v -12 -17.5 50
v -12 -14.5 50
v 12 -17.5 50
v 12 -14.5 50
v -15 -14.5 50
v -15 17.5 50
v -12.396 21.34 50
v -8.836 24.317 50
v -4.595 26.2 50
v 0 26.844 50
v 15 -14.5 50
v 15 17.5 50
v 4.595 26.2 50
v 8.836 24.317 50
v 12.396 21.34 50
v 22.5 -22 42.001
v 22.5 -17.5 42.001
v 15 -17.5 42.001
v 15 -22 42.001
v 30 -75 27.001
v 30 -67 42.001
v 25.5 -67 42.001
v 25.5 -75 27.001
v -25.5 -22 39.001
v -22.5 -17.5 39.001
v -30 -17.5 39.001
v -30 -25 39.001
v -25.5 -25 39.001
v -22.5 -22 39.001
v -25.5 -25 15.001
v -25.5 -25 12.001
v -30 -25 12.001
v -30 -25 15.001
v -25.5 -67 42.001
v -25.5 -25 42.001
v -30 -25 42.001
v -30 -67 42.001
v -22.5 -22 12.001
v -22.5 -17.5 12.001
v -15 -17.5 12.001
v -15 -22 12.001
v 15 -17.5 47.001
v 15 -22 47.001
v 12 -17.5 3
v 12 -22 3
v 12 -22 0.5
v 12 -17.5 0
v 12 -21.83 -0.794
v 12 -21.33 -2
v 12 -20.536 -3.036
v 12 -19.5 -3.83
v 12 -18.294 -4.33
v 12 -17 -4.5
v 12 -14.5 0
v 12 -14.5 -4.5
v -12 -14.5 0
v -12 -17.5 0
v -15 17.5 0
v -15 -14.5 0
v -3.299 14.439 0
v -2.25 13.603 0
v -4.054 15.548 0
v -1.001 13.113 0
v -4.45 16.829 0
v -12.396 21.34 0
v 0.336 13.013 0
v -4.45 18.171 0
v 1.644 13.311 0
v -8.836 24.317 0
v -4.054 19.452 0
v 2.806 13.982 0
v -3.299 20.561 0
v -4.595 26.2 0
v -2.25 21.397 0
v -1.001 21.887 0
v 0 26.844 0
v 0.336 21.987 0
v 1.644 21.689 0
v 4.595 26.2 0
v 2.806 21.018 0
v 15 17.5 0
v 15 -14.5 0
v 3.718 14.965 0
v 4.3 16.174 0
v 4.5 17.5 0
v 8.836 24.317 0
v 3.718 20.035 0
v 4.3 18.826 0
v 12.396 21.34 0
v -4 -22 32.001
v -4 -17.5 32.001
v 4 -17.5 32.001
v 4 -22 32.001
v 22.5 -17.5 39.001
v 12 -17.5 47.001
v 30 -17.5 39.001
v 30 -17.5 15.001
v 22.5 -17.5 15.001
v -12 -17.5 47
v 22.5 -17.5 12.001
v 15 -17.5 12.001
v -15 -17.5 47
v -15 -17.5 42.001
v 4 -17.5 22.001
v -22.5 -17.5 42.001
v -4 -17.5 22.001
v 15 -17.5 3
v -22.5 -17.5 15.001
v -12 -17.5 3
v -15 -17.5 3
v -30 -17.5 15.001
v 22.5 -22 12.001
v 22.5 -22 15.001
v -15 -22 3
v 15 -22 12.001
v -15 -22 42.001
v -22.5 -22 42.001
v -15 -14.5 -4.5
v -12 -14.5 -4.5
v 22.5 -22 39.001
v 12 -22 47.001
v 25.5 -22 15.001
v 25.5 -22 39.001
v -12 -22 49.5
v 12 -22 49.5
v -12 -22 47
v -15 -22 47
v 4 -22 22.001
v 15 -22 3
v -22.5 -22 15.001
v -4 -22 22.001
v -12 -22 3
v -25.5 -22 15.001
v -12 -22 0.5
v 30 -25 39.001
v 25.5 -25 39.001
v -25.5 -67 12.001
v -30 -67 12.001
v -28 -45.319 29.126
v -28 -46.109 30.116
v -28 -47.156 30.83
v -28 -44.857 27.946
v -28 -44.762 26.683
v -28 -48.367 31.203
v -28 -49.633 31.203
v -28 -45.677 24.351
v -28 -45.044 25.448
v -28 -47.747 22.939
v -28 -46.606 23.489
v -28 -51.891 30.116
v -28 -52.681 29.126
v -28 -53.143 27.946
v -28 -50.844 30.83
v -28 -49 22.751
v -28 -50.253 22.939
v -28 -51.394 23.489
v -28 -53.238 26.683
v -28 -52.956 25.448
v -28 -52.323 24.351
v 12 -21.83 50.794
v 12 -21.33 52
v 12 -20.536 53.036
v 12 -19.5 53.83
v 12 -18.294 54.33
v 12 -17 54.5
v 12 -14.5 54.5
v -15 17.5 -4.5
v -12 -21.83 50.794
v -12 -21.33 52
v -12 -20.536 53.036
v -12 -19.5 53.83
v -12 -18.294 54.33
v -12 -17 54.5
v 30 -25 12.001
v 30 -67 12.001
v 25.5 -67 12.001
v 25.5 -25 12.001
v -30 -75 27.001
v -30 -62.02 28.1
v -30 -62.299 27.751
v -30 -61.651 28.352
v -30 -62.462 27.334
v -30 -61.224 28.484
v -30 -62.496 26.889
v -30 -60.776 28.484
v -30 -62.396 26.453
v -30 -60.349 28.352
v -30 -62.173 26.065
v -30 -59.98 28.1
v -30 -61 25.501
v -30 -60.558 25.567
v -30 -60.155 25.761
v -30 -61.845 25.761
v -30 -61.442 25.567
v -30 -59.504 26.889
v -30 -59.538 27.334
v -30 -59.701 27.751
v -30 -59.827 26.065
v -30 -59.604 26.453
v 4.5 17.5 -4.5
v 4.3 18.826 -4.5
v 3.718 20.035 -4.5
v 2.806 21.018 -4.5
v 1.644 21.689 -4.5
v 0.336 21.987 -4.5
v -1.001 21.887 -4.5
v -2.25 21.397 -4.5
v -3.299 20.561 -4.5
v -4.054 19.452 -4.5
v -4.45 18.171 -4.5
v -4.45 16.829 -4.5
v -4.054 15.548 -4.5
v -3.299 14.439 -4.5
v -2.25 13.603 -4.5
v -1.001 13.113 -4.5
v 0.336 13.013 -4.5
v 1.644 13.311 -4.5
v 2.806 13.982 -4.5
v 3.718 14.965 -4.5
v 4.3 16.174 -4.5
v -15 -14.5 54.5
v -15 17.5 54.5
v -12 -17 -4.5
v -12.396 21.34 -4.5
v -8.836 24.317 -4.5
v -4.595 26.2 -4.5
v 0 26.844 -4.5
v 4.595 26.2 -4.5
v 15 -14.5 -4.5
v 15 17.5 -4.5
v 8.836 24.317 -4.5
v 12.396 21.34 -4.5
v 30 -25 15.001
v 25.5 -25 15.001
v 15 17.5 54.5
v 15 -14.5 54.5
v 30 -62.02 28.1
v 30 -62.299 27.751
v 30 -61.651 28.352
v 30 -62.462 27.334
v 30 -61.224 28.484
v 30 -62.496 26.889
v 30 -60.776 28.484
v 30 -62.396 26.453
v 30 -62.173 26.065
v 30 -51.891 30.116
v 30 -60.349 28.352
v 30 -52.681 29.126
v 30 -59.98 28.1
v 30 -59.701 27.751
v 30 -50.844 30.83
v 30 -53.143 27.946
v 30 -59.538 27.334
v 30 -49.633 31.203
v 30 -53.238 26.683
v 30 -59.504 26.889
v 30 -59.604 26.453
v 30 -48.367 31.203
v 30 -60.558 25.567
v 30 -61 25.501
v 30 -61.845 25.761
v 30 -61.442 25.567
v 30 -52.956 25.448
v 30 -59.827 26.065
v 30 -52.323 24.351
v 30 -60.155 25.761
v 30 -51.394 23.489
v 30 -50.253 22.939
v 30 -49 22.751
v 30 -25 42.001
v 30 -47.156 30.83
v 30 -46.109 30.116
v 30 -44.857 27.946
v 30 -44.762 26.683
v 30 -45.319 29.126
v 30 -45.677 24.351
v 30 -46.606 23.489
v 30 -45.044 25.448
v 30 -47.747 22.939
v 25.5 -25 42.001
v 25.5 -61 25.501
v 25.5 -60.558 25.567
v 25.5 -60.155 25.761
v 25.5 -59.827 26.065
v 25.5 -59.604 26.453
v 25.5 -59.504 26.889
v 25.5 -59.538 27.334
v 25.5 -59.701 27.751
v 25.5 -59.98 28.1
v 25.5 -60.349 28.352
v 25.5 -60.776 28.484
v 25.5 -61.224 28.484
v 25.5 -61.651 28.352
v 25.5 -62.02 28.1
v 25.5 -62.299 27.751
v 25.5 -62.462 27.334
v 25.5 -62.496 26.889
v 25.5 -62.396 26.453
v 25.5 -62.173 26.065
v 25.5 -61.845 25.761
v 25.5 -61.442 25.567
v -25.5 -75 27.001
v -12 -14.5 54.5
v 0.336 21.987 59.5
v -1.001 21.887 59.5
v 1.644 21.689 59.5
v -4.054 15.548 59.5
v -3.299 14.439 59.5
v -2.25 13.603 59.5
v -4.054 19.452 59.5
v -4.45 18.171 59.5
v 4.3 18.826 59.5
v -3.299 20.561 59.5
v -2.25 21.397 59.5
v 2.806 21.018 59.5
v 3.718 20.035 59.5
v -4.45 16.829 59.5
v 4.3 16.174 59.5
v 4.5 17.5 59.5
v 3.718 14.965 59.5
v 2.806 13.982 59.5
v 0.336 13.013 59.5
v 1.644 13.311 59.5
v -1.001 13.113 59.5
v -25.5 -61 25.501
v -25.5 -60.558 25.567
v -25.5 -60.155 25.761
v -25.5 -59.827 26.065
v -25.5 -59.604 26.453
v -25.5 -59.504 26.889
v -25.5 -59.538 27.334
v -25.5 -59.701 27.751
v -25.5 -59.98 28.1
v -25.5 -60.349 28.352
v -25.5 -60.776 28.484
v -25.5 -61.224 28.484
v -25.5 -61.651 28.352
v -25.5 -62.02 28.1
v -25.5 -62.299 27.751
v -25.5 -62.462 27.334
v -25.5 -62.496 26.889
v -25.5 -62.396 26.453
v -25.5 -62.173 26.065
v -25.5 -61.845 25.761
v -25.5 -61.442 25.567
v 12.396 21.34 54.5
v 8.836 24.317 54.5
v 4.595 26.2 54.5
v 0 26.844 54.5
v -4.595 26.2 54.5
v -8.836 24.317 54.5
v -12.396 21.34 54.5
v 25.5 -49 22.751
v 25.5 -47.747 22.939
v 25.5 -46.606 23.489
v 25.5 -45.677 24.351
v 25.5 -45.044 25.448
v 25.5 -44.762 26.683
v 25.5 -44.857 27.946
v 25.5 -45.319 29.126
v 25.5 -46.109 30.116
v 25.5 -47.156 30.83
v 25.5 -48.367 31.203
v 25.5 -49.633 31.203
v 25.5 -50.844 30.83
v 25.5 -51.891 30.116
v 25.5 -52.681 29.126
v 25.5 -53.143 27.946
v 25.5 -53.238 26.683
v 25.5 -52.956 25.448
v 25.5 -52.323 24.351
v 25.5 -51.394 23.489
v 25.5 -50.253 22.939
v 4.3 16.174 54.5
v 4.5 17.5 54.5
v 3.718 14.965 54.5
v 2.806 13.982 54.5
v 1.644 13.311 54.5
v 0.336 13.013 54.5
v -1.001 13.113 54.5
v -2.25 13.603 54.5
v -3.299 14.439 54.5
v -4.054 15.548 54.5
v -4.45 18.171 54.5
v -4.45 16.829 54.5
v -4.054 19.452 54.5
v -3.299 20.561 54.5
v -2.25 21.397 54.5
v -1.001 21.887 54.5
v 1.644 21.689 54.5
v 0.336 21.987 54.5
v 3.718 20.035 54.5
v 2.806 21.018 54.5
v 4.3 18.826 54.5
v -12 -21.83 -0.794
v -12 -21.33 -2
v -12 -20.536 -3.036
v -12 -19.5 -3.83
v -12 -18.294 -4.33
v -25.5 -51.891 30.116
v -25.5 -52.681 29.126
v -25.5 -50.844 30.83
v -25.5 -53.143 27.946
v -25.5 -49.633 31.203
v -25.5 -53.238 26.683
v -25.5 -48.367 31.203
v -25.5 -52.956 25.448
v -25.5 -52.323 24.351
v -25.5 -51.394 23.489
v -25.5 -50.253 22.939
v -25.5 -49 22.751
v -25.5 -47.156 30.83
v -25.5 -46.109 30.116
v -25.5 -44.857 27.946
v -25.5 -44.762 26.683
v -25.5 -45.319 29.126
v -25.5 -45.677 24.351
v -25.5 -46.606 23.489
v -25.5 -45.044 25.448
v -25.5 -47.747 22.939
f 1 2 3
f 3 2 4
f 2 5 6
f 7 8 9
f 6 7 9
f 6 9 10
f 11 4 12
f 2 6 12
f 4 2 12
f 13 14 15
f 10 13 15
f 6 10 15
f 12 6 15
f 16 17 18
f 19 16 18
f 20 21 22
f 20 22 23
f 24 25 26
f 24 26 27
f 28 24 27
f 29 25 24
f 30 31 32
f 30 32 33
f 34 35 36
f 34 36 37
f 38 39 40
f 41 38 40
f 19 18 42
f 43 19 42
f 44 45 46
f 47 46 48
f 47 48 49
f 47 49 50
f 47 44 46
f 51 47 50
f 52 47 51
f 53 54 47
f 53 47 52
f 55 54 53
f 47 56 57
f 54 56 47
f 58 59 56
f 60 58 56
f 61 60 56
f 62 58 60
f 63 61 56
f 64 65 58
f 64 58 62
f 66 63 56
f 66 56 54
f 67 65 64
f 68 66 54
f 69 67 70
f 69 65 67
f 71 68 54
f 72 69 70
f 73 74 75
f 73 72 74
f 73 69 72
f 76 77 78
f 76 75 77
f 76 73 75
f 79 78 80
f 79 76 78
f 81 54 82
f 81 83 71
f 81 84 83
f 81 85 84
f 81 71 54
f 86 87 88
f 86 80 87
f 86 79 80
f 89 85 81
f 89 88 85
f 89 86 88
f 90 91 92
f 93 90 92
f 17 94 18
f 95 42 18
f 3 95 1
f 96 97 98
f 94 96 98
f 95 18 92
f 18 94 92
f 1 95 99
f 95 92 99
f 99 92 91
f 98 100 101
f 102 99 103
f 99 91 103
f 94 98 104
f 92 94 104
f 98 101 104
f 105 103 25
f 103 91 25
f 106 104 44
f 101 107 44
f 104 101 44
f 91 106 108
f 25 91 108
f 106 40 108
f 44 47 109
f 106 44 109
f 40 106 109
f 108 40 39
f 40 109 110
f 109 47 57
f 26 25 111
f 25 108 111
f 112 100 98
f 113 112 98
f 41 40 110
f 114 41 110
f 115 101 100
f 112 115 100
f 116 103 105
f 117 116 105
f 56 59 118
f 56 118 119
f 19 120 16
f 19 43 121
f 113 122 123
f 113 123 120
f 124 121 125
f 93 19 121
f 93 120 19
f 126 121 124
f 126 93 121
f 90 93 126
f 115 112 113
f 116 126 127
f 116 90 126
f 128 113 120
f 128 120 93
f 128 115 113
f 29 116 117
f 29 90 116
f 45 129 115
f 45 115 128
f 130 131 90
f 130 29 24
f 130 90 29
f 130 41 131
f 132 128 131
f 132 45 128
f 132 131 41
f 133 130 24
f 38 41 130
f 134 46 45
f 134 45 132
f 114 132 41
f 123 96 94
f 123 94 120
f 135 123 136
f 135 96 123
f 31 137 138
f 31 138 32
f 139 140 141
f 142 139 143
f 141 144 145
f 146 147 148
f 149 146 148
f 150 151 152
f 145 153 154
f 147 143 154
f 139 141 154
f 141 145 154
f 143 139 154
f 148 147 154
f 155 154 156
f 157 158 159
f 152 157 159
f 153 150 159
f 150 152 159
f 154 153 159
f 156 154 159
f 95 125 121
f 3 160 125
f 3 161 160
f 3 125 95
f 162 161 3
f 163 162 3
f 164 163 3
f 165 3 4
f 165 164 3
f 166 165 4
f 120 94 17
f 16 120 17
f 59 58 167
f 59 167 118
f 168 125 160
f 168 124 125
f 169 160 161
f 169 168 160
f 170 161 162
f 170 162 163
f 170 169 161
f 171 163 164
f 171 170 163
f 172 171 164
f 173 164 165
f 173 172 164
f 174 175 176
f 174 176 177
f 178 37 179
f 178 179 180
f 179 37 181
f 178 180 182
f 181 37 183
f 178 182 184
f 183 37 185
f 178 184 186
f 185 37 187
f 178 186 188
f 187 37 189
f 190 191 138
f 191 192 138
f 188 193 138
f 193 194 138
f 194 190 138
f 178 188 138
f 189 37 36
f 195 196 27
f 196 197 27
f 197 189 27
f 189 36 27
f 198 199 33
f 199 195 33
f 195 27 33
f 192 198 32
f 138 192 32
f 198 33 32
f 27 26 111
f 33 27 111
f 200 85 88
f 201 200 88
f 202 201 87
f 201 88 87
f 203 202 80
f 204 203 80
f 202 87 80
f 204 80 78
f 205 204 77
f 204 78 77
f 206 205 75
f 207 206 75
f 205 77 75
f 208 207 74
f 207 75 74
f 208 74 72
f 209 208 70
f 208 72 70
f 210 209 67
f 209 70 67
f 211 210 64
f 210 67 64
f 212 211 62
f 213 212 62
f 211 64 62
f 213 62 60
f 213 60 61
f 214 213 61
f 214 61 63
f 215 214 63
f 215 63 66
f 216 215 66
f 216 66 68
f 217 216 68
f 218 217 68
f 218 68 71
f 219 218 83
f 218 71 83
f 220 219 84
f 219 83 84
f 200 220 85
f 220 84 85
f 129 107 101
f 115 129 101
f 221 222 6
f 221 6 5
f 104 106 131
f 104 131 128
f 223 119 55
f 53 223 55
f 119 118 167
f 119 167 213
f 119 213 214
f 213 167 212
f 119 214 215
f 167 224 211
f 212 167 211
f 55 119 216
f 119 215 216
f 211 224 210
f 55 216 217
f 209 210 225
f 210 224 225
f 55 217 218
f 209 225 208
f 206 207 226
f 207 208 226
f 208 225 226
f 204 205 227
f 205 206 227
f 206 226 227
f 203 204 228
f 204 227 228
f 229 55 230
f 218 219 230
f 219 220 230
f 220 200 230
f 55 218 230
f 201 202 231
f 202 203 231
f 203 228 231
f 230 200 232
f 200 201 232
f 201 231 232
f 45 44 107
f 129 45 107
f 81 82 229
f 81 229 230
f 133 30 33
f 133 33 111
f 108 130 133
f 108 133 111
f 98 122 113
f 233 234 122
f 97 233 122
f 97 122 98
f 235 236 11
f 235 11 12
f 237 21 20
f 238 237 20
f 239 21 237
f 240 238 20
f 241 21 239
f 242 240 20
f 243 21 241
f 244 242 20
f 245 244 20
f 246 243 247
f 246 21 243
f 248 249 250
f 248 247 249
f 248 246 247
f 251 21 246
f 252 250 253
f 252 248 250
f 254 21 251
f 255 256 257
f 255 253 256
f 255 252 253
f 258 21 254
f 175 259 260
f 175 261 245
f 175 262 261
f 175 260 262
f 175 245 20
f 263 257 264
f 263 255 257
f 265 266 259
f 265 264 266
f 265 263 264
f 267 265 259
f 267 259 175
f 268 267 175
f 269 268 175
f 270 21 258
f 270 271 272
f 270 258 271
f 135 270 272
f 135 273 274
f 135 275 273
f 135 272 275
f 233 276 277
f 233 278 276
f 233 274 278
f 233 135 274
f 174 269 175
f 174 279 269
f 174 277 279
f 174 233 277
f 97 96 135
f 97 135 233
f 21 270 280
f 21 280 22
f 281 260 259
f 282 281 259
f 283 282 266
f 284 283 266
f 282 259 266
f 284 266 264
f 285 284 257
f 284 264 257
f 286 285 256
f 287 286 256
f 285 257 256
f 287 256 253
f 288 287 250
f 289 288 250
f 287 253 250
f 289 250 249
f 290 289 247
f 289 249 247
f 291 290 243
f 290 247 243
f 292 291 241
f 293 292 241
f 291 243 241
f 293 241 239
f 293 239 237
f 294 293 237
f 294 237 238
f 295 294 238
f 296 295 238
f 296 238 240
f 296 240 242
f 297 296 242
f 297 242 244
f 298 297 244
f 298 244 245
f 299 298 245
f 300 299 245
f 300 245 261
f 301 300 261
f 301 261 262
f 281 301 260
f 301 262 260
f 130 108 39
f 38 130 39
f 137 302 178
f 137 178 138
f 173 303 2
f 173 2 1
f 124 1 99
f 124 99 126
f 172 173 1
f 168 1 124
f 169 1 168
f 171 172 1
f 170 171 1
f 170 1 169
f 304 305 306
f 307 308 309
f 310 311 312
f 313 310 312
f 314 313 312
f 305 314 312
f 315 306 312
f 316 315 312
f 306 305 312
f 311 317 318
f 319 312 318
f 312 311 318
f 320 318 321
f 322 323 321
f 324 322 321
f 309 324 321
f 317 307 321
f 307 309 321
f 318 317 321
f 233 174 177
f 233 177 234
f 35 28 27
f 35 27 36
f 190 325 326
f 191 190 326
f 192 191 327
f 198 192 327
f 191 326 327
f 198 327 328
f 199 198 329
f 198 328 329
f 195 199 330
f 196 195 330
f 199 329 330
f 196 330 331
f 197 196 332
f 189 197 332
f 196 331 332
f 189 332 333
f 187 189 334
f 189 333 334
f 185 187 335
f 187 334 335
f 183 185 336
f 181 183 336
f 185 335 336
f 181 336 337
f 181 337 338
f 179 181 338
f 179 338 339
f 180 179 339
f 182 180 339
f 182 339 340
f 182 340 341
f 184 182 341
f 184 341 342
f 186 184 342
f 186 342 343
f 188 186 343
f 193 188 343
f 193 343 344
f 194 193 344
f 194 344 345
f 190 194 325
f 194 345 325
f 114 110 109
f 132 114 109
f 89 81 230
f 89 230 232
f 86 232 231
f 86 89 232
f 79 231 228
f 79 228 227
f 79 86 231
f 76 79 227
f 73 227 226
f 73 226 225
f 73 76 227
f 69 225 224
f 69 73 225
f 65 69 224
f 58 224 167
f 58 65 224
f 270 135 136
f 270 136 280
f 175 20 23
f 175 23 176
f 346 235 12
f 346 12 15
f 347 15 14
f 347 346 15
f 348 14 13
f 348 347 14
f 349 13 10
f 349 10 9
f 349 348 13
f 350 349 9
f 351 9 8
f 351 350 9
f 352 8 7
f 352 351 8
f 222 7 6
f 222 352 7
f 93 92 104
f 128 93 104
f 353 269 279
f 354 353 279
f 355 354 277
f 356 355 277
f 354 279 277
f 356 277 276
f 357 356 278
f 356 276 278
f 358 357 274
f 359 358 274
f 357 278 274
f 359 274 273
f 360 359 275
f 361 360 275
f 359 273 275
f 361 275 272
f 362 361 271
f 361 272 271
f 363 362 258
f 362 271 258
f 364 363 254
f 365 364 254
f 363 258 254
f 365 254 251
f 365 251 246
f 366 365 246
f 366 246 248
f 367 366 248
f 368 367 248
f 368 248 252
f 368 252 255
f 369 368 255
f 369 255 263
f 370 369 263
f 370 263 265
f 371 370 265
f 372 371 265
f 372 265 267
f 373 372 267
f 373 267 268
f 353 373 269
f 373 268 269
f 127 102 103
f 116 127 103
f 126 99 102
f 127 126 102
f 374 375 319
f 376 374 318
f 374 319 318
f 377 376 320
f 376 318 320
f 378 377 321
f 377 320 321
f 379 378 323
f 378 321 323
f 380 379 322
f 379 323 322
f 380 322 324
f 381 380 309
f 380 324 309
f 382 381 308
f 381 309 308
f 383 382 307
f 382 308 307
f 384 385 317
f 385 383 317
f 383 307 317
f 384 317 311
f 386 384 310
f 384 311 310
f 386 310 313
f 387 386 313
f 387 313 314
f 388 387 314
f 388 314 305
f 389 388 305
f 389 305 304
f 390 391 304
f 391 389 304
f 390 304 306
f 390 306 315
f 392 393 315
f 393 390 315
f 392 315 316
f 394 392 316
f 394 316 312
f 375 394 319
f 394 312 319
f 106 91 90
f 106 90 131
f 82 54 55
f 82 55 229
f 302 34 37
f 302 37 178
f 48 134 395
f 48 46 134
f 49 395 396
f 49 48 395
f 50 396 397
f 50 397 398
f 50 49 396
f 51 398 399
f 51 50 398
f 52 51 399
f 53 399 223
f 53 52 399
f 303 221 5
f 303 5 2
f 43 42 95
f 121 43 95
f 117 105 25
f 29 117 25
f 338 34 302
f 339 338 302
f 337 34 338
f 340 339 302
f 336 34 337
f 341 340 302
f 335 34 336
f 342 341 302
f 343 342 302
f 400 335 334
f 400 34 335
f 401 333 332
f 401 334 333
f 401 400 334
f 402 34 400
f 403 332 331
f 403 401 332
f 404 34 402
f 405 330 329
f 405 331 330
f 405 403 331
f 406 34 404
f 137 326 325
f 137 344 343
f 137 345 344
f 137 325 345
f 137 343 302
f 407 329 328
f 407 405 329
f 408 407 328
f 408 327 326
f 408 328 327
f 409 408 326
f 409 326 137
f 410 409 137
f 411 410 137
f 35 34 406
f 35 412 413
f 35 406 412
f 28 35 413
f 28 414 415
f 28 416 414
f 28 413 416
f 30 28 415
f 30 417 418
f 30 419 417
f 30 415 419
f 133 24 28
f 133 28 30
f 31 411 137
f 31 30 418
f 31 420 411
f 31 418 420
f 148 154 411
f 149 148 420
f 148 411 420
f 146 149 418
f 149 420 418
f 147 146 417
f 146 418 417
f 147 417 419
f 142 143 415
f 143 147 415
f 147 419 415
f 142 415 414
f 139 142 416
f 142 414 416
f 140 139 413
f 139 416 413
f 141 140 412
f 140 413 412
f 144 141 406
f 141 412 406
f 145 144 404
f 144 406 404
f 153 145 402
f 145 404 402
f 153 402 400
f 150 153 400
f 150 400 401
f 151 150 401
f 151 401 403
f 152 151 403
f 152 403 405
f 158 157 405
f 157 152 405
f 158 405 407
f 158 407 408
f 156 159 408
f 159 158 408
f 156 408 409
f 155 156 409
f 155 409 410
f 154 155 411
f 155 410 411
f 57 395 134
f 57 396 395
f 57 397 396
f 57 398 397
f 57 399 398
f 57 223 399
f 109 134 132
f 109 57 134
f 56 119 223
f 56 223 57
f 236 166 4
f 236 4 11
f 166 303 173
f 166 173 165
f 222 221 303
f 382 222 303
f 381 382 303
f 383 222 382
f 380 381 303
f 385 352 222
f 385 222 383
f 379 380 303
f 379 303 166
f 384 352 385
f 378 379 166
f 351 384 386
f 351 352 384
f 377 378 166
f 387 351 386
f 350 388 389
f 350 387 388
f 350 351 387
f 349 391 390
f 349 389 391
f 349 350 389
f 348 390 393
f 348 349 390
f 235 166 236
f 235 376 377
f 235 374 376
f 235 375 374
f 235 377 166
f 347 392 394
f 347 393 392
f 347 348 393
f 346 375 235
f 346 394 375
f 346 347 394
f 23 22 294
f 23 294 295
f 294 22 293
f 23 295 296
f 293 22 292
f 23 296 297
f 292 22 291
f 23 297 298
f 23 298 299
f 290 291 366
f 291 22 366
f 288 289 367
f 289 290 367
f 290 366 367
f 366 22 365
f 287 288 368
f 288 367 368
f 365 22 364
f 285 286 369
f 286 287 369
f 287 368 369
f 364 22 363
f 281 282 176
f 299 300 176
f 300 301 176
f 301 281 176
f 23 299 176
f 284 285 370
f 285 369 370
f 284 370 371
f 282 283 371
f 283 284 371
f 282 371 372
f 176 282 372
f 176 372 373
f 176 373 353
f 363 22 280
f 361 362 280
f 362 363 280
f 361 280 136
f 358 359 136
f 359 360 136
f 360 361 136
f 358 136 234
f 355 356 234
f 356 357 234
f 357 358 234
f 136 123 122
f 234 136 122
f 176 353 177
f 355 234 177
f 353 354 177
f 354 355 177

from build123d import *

# Parameters (mm, degrees)
SKETCH1_R           = 4.5
BOSS_EXTRUDE1_DEPTH = 4.5
SKETCH2_W           = 8
SKETCH2_H           = 10
BOSS_EXTRUDE2_DEPTH = 4.5
BOSS_EXTRUDE3_START = 4.5
SKETCH3_R           = 4.5
BOSS_EXTRUDE3_DEPTH = 4.5
FILLET3_R           = 5
FILLET4_R           = 5
SKETCH6_R           = 4.25
SKETCH6_R_2         = 1.5
BOSS_EXTRUDE4_DEPTH = 4.5
BOSS_EXTRUDE5_START = 4.5
SKETCH7_R           = 4.25
SKETCH7_R_2         = 1.5
BOSS_EXTRUDE5_DEPTH = 4.5
BOSS_EXTRUDE6_START = -2
SKETCH8_R           = 4.25
BOSS_EXTRUDE6_DEPTH = 2
BOSS_EXTRUDE7_START = -9.5
SKETCH9_R           = 4.5
BOSS_EXTRUDE7_DEPTH = 9.5


with BuildPart() as part:
    # Sketch1 → Boss-Extrude1 (new body)
    with BuildSketch(Plane.XY):
        with BuildLine():
            Line((-15, 17.5), (-15, -14.5))
            Line((-15, -14.5), (-12, -14.5))
            Line((-12, -14.5), (-12, -17.5))
            Line((-12, -17.5), (12, -17.5))
            Line((12, -17.5), (12, -14.5))
            Line((12, -14.5), (15, -14.5))
            Line((15, -14.5), (15, 17.5))
            ThreePointArc((15, 17.5), (0, 26.843803595), (-15, 17.5))
        make_face()
        with Locations((0, 17.5)):
            Circle(SKETCH1_R, mode=Mode.SUBTRACT)
    extrude(amount=-BOSS_EXTRUDE1_DEPTH)

    # Sketch2 → Boss-Extrude2 (add)
    with BuildSketch(Plane(origin=(0, -17.5, 0), x_dir=(1, 0, 0), z_dir=(0, 1, 0))):
        Polygon((-12, 4.5), (12, 4.5), (12, 0), (12, -3), (15, -3), (15, -12.000675804), (22.5, -12.000675804), (22.5, -15.000675804), (25.5, -15.000675804), (30, -15.000675804), (30, -39.000675804), (25.5, -39.000675804), (22.5, -39.000675804), (22.5, -42.000675804), (15, -42.000675804), (15, -47.001351609), (12, -47.001351609), (12, -50), (12, -54.5), (-12, -54.5), (-12, -50), (-12, -47), (-15, -47), (-15, -42.000675804), (-22.5, -42.000675804), (-22.5, -39.000675804), (-25.5, -39.000675804), (-30, -39.000675804), (-30, -15.000675804), (-25.5, -15.000675804), (-22.5, -15.000675804), (-22.5, -12.000675804), (-15, -12.000675804), (-15, -3), (-12, -3), (-12, 0), align=None)
        with Locations((0, -27.000675804)):
            Rectangle(SKETCH2_W, SKETCH2_H, mode=Mode.SUBTRACT)
    extrude(amount=-BOSS_EXTRUDE2_DEPTH)

    # Sketch3 → Boss-Extrude3 (add)
    with BuildSketch(Plane.XY.offset(50).offset(BOSS_EXTRUDE3_START)):
        with BuildLine():
            Line((-15, 17.5), (-15, -14.5))
            Line((-15, -14.5), (-12, -14.5))
            Line((-12, -14.5), (-12, -17.5))
            Line((-12, -17.5), (12, -17.5))
            Line((12, -17.5), (12, -14.5))
            Line((12, -14.5), (15, -14.5))
            Line((15, -14.5), (15, 17.5))
            ThreePointArc((15, 17.5), (0, 26.843803595), (-15, 17.5))
        make_face()
        with Locations((0, 17.5)):
            Circle(SKETCH3_R, mode=Mode.SUBTRACT)
    extrude(amount=-BOSS_EXTRUDE3_DEPTH)

    # Fillet3
    fillet3_edges = [part.edges().sort_by_distance(p)[0] for p in [
        (0, -22, 54.5),
    ]]
    fillet(fillet3_edges, radius=FILLET3_R)

    # Fillet4
    fillet4_edges = [part.edges().sort_by_distance(p)[0] for p in [
        (0, -22, -4.5),
    ]]
    fillet(fillet4_edges, radius=FILLET4_R)

    # Sketch6 → Boss-Extrude4 (add)
    with BuildSketch(Plane(origin=(-25.5, 0, 0), x_dir=(0, 0, -1), z_dir=(1, 0, 0))):
        Polygon((-15.000675804, -22), (-39.000675804, -22), (-39.000675804, -25), (-42.000675804, -25), (-42.000675804, -67), (-27.000675804, -75), (-12.000675804, -67), (-12.000675804, -25), (-15.000675804, -25), align=None)
        with Locations((-27.000675804, -49)):
            Circle(SKETCH6_R, mode=Mode.SUBTRACT)
        with Locations((-27.000675804, -61)):
            Circle(SKETCH6_R_2, mode=Mode.SUBTRACT)
    extrude(amount=-BOSS_EXTRUDE4_DEPTH)

    # Sketch7 → Boss-Extrude5 (add)
    with BuildSketch(Plane(origin=(25.5, 0, 0), x_dir=(0, 0, -1), z_dir=(1, 0, 0)).offset(BOSS_EXTRUDE5_START)):
        Polygon((-39.000675804, -22), (-39.000675804, -25), (-42.000675804, -25), (-42.000675804, -67), (-27.000675804, -75), (-12.000675804, -67), (-12.000675804, -25), (-15.000675804, -25), (-15.000675804, -22), align=None)
        with Locations((-27.000675804, -49)):
            Circle(SKETCH7_R, mode=Mode.SUBTRACT)
        with Locations((-27.000675804, -61)):
            Circle(SKETCH7_R_2, mode=Mode.SUBTRACT)
    extrude(amount=-BOSS_EXTRUDE5_DEPTH)

    # Sketch8 → Boss-Extrude6 (add)
    with BuildSketch(Plane.ZY.offset(30).offset(BOSS_EXTRUDE6_START)):
        with Locations(Location((27.000675804, -49, 0), (0, 0, 180))):
            Circle(SKETCH8_R)
    extrude(amount=BOSS_EXTRUDE6_DEPTH)

    # Sketch9 → Boss-Extrude7 (add)
    with BuildSketch(Plane(origin=(0, 0, 50), x_dir=(-1, 0, 0), z_dir=(0, 0, -1)).offset(BOSS_EXTRUDE7_START)):
        with Locations(Location((0, 17.5, 0), (0, 0, 180))):
            Circle(SKETCH9_R)
    extrude(amount=BOSS_EXTRUDE7_DEPTH)


solid = part.part
